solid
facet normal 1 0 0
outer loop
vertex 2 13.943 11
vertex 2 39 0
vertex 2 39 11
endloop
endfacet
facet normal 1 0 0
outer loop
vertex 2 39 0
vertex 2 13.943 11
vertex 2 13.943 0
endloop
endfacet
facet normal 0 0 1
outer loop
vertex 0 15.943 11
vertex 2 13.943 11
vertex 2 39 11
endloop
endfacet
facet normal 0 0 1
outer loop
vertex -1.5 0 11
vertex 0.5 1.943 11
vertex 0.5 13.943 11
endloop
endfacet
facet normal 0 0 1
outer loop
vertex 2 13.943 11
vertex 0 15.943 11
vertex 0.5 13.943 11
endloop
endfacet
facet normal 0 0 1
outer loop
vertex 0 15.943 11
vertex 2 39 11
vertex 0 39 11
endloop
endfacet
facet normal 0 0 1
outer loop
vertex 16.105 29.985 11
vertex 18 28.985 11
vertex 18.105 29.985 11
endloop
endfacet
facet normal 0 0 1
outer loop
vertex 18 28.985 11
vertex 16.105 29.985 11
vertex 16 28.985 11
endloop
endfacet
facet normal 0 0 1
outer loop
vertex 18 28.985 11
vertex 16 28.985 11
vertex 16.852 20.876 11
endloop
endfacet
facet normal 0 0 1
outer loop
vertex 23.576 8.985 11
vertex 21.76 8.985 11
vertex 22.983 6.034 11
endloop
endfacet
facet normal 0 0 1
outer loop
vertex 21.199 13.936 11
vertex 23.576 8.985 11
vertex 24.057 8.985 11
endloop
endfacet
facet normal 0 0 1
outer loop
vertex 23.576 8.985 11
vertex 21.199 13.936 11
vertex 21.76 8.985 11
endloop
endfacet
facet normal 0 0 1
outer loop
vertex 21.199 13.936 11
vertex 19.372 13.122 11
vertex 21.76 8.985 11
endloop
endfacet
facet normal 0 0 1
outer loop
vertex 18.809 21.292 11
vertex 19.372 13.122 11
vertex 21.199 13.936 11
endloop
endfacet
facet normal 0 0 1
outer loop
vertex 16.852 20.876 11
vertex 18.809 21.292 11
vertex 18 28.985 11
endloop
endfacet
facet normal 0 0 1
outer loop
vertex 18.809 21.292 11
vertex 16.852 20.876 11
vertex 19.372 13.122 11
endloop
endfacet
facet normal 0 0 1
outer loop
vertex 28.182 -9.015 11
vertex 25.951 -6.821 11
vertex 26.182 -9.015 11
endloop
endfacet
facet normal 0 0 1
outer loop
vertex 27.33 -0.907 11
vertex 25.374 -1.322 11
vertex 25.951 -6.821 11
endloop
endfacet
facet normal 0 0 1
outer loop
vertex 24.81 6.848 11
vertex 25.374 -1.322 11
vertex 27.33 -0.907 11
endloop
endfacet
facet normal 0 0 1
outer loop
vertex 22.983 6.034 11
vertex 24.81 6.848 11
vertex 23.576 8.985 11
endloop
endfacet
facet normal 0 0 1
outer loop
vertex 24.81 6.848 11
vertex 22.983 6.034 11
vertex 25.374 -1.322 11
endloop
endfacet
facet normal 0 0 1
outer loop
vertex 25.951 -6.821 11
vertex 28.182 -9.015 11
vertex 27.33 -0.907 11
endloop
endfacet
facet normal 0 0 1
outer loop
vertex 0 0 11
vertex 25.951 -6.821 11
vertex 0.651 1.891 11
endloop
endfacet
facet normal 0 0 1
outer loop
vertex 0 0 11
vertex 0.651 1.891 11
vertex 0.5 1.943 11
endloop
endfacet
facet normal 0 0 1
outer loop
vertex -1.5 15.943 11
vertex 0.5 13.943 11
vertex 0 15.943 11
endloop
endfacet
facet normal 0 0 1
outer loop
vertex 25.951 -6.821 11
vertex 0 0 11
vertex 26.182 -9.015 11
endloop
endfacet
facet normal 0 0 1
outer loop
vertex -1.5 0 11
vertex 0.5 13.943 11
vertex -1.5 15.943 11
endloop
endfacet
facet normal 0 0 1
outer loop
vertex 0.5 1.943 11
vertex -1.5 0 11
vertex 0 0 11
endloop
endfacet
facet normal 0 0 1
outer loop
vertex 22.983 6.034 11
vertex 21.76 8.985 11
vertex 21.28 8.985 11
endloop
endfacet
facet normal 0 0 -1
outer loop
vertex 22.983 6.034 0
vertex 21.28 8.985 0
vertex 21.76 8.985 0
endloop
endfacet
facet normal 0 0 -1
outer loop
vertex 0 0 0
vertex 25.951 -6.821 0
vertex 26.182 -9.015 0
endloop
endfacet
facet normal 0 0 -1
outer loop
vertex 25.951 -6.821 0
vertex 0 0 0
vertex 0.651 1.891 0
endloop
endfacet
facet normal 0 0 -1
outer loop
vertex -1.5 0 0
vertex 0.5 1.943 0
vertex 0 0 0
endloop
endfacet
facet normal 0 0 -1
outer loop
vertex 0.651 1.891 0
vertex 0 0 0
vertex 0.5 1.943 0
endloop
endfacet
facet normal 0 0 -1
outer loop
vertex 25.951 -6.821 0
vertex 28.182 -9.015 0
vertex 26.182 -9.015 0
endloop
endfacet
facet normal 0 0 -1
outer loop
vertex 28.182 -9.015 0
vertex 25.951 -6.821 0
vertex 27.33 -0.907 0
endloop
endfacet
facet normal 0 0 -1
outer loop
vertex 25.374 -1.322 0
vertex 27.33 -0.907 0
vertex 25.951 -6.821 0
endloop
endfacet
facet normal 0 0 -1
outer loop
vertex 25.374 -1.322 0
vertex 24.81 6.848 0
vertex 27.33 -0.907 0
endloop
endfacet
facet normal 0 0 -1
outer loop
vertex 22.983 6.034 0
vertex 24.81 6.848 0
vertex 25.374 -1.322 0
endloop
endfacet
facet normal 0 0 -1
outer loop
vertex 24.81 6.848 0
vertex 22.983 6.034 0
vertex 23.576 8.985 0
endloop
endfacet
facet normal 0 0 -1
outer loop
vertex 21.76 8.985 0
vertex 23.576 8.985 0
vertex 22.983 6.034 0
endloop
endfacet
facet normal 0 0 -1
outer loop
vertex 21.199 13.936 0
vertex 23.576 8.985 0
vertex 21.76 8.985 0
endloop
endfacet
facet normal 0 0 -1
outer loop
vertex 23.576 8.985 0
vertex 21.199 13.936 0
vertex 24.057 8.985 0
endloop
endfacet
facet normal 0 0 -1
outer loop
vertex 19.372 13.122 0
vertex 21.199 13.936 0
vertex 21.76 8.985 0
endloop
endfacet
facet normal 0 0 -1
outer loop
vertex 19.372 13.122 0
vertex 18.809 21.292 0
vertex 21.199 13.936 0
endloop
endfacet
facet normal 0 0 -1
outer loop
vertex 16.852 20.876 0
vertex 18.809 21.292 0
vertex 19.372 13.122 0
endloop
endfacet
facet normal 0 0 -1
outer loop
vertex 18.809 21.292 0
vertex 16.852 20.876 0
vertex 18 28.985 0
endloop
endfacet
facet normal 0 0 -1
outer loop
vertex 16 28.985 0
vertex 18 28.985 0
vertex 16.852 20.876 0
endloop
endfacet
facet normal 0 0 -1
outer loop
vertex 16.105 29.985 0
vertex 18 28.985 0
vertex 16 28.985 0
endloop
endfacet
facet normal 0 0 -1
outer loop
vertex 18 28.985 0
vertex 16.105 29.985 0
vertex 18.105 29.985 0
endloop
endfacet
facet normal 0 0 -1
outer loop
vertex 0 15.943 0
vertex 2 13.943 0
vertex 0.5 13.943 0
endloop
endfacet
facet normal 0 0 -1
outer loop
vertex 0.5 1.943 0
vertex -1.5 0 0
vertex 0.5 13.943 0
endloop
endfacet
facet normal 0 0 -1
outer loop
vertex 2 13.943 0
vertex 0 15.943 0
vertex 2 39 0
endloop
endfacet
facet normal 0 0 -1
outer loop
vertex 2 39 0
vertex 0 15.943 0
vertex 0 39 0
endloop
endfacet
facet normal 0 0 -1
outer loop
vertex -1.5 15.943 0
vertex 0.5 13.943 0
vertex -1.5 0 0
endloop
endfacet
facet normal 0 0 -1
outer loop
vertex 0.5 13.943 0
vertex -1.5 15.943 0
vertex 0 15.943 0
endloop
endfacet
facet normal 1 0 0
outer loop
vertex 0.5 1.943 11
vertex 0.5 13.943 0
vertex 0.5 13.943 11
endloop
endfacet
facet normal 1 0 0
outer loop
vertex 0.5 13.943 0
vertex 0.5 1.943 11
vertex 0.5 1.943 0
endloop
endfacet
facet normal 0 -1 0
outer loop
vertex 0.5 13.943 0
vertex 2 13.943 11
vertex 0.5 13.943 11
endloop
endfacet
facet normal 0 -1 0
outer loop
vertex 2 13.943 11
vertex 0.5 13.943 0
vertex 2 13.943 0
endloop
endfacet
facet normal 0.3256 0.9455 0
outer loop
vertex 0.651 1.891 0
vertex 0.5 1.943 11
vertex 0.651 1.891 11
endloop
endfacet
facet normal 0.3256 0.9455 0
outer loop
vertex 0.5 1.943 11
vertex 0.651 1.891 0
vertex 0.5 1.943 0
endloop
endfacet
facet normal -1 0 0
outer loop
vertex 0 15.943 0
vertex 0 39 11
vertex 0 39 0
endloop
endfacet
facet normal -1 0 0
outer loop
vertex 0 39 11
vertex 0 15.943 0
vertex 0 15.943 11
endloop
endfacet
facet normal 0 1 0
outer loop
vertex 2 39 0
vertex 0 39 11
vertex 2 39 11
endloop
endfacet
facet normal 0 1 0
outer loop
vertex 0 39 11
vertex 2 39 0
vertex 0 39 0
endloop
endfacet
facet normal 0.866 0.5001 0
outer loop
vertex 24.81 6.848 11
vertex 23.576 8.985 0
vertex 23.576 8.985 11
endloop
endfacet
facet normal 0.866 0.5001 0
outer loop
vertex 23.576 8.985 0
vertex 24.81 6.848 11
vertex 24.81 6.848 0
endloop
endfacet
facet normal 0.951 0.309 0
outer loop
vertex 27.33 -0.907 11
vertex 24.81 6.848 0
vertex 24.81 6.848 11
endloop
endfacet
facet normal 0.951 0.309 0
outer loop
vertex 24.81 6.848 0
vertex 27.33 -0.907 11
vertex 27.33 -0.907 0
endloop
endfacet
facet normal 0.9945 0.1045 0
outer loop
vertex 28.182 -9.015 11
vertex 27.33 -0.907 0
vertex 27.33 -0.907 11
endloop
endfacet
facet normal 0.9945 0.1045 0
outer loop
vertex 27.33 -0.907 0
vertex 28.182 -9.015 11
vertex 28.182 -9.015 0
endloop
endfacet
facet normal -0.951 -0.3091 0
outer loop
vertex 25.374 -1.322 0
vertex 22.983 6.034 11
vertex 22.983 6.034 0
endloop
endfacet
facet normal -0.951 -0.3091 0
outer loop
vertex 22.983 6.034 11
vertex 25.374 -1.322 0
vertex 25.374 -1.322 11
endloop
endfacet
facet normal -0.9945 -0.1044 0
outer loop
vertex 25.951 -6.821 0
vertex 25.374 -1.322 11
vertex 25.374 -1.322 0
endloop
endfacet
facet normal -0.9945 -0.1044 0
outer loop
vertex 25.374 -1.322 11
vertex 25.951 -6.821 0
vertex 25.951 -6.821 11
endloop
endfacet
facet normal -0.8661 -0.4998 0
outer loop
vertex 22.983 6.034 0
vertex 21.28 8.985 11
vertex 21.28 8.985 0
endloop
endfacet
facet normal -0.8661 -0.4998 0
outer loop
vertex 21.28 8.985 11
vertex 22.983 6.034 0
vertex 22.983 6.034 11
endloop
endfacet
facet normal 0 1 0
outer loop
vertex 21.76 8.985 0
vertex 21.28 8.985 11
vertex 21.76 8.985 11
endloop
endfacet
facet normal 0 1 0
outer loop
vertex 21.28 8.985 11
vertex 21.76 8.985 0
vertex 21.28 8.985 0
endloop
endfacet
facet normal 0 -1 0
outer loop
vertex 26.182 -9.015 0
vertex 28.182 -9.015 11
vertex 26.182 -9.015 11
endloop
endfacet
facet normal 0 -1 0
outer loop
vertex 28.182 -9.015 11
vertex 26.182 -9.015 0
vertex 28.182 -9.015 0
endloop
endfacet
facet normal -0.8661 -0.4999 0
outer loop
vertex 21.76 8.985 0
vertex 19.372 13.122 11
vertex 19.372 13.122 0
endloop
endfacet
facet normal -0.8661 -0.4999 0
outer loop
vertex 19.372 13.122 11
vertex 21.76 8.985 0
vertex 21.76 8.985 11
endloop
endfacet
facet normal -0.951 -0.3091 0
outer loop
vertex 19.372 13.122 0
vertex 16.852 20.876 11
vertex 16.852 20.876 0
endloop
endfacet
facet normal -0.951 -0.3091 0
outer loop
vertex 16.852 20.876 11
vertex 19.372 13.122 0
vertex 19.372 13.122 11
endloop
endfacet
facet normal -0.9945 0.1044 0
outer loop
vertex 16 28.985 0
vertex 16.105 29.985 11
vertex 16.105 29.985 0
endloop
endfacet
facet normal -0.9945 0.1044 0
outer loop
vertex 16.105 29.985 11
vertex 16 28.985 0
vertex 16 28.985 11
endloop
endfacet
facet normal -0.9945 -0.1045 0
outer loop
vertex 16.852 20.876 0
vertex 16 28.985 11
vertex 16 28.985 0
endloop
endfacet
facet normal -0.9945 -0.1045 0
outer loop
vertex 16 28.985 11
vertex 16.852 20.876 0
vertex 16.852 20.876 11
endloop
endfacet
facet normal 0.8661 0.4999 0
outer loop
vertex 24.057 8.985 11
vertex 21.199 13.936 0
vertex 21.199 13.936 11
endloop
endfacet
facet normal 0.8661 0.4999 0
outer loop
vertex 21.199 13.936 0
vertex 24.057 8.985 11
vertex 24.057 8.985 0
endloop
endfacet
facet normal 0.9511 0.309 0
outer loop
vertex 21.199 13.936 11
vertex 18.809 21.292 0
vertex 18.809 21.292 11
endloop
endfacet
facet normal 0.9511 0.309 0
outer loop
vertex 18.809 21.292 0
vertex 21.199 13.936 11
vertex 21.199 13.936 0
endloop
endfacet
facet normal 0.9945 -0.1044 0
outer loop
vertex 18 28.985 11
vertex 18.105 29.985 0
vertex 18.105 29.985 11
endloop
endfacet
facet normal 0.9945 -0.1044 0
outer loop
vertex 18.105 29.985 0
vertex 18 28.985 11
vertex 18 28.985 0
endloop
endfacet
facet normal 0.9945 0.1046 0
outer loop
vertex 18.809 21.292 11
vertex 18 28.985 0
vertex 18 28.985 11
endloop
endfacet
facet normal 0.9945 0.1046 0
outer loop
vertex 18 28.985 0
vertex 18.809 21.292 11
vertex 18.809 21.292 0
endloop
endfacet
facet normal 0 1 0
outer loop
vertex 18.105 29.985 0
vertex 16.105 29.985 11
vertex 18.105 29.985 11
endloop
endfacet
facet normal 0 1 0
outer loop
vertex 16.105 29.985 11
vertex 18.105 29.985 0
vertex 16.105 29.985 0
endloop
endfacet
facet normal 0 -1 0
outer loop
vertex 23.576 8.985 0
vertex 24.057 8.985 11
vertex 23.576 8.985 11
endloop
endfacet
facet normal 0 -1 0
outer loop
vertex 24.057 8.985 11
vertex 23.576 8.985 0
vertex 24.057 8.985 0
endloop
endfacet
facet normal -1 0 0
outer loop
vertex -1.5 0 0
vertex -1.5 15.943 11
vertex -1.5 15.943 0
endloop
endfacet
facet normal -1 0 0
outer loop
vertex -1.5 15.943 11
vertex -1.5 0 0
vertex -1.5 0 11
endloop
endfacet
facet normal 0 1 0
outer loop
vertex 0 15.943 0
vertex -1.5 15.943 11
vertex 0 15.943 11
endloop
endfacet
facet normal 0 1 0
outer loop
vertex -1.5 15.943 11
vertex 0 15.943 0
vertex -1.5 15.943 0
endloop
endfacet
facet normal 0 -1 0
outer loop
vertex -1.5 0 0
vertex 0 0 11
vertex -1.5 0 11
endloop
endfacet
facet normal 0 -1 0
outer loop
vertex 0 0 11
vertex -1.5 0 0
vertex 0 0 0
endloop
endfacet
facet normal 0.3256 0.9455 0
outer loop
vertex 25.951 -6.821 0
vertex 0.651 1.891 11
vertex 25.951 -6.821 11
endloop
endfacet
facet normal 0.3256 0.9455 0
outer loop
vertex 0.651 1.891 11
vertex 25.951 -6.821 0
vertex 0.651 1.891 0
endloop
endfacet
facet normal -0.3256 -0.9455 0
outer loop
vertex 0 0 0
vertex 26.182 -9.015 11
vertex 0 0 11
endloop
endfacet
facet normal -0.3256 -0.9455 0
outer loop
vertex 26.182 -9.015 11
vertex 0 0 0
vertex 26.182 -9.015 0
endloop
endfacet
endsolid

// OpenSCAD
// file: lib/spring.scad
module spring(d, width, angle, thickness) {
    T = polar_to_cartesian(d + thickness, angle);
    tw = abs((T[0] - thickness) / 2);

    spring_first_part(d = d, tw = tw, width=width, angle = angle, thickness = thickness);
    spring_second_part(d = d, T = T, width=width, angle = angle, thickness = thickness);
    spring_third_part(d = d, T = T, tw = tw, width=width, angle = angle, thickness = thickness);
}

module spring_third_part(d, T, tw, width, angle, thickness) {
    intersection() {
        spring_second_cylinder(d = d, T = T, width = width, angle = angle, thickness = thickness);
        translate([0, tw, 0])
            cube([width, d / 2 + thickness - tw, d / 2]);
    }
}

module spring_second_part(d, T, width, angle, thickness) {
    intersection() {
        spring_first_cylinder(d = d, width = width, thickness = thickness);
        spring_second_cylinder(d = d, T = T, width = width, angle = angle, thickness = thickness);
    }
}

module spring_first_part(d, tw, width, angle, thickness) {
    intersection() {
        spring_first_cylinder(d = d, width = width, thickness = thickness);
        cube([width, tw, d / 2]);
    }
}

module spring_first_cylinder(d, width, thickness) {
    translate([0, 0, d / 2 + thickness])
        spring_cylinder(d = d, width = width, thickness = thickness);
}

module spring_second_cylinder(d, T, width, angle, thickness) {
    translate([0, T[0], T[1]])
        // + thickness is wrong - it should be translated in 2 axis
        translate([0, 0, d / 2 + thickness])
            spring_cylinder(d = d, width = width, thickness = thickness);
}

module spring_cylinder(d, width, thickness) {
    rotate([0, 90, 0])
        difference() {
            cylinder(h = width, d = d + thickness * 2);
            cylinder(h = width, d = d);
        }
}

function polar_to_cartesian(length, angle) = [length * cos(angle), length * sin(angle)];
// main file
use <lib/spring.scad>

// start parameters
table_thickness = 17;
height = 39;
width = 11;
thickness = 2;
spring_stretch = 3;
spring_angle = -60;
angle = -19;
edge_over = 1.5;
edge_over_length = 12;
// end parameters

spring_z_position = table_thickness - spring_stretch;

length = height * 2 - thickness;
cartesian = polar_to_cartesian(length, spring_angle);
x2_before_translate = polar_to_cartesian(length, spring_angle);
s2 = [x2_before_translate[0], x2_before_translate[1] + height - table_thickness];
spring_z = s2[1] + height;

base_height = table_thickness + spring_z + spring_z_position;
c = base_height / cos(angle);
a  = sqrt(c * c - base_height * base_height);
spring_dir = angle < 0 ? -1 : 1;

P = [0, 0];
A = [0, thickness];
v = P - A;

Bl = thickness;
Bangle = (90 - 180 - angle) * -1;
Bc = polar_to_cartesian(length = Bl, angle = Bangle);
Bc1 = [Bc[1], Bc[0]];

n = P - Bc1;
cc = (-n[0] * Bc1[0] - n[1] * Bc1[1]) * -1;
yy = thickness - edge_over;
xx = -(n[1] * yy - cc) / n[0];

yy2 = yy + edge_over;
xx2 = -(n[1] * yy2 - cc) / n[0];

translate([-edge_over, 0, 0])
    cube([edge_over, edge_over_length + xx + thickness, width]);

difference() {
    cube([thickness, height, width]);
    union() {
        translate([yy, xx, 0])
            cube([edge_over, edge_over_length, width]);
        linear_extrude(height = width)
            polygon(points = [
                [yy, xx],
                [yy2, xx2],
                [yy2, xx2 + xx - xx2 + 1]
            ]);
    }
}

rotate([0, 0, angle])
    cube([c, thickness, width]);

translate([base_height + thickness, a * spring_dir, 0])
    rotate([0, 180, 0])
        rotate([0, 90, 0])
            spring(
                d = height * 2 - thickness * 2,
                width = width,
                angle = spring_angle,
                thickness = thickness
            );

function polar_to_cartesian(length, angle) = [length * cos(angle), length * sin(angle)];
